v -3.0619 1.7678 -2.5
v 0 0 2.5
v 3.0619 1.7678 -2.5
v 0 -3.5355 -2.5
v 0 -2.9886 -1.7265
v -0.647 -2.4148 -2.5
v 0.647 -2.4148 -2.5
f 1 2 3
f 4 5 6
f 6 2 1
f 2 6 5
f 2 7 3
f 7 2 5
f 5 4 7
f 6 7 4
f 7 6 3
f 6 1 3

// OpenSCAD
// 4面体骰子
module item(w=10,d=45,p=0){
    rotate([d,0,p])
        cube([w*3,w,w*3],center=true);
}

module dice_4(w=10){
    intersection(){
        translate([0,0,-w])
            intersection_for (a = [ 0 : 2 ])
                item(w,90-acos(1/3),120*a);
        item(w,90,0);
    }
}

w=5;
dice_4(w);

echo(pow(3,1/2));
